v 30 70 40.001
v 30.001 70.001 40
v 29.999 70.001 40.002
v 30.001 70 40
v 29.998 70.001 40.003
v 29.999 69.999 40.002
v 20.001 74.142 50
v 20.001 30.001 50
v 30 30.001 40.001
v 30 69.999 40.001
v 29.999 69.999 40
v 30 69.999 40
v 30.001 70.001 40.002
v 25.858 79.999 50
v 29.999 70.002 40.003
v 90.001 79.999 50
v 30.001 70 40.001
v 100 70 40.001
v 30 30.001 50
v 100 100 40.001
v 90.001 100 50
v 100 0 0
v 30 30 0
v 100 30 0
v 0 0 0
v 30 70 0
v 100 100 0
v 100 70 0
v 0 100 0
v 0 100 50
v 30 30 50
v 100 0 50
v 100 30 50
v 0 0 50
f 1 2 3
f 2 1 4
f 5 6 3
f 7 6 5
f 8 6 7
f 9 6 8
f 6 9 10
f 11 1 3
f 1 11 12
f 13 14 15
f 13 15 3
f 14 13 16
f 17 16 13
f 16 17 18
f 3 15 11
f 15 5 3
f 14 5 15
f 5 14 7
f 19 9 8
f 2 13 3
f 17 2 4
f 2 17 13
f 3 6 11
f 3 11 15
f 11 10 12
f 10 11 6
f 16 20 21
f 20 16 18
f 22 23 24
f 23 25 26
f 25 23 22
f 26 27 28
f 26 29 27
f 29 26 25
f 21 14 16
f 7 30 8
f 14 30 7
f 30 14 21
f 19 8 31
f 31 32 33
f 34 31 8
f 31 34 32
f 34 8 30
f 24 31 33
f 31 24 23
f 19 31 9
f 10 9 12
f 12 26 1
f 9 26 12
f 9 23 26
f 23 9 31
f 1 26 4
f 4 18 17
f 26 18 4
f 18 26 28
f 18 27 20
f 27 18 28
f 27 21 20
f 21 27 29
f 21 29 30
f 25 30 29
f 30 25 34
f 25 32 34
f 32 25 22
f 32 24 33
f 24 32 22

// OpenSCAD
//==============================================================================
//
//           prism-chamfer - the missing chamfer tool for OpenSCAD
//
// Author:  Heath Raftery
// Origin:  http://github.com/hraftery/prism-chamfer
// License: GPLv3, see LICENSE for terms.
//
// See the accompanying README for instructions on use.
//
//==============================================================================

// Thingiverse requires a single .scad file, so instead of using an include
// the file's contents are appended below.
//include <prism-chamfer.scad>;

// Thingiverse also doesn't support boolean variables, hence the "0:false" trick below.

// Zero-based index of first edge in the polygon to be chamfered.
Start_edge=3;
// Zero-based index of last edge. Must be equal to or greater than Start_edge.
End_edge=5;
// If true, chamfer the edges at the top of the prism. Else, chamfer the bottom edges.
Top=1; // [0:false, 1:true]
// Length of the sides of the chamfer, or just the top/bottom side if Enable_side2 is true.
Side_length=10;
// If true, allow the length of the sides of the chamfer to be set independantly.
Enable_side2=0; // [0:false, 1:true]
// If Enable_side2 is true, length of the side parallel to the z-axis. Ignored otherwise.
Side2_length=15;
// Depth of the chamfer in any inner corners between start_edge and end_edge.
Corner_slope="medium"; // [shallow, medium, deep]

difference() {
  polygon_points = [[0,0],[100,0],[100,30],[30,30],[30,70],[100,70],[100,100],[0,100]];
  h=50;
  linear_extrude(height=h)
    polygon(polygon_points, convexity=2);

  prism_chamfer_mask(polygon_points, Start_edge, End_edge, Top?h:0,
                     Side_length, Enable_side2 ? Side2_length : Side_length, Corner_slope);
}




// The contents of prism-chamfer.scad follow


//===========
// Variables
//===========

ff=0.001; // Fudge factor: amount of extra mask to prevent zero thickness planes.


//===========
// Functions
//===========

function angle_of(p0, p1) = atan2(p1.y-p0.y, p1.x-p0.x); //note contrary to docs, atan2 returns [-180,180]
function translate_towards(p0, p1, dist) = p0 + (dist/norm(p1-p0))*(p1-p0);
function min_index(v, only_first=false) = search(min(v), v, only_first?1:0);
function max_index(v, only_first=false) = search(max(v), v, only_first?1:0);

//Return the three points that define the vertex at the point specified
function vertex_points(polygon_points, point_index) =
  let (num_pts = len(polygon_points))
    [ polygon_points[(point_index-1+num_pts) % num_pts],
      polygon_points[ point_index                     ],
      polygon_points[(point_index+1)         % num_pts] ];

//Determine orientation of polygon. Ref:
//  https://en.wikipedia.org/wiki/Curve_orientation#Orientation_of_a_simple_polygon
function is_polygon_orientation_clockwise(polygon_points) =
  let (min_x_indices                = min_index([for (pt = polygon_points) pt.x]),
       min_y_index_in_min_x_indices = min_index([for (i = min_x_indices) polygon_points[i].y]),
       min_x_min_y_index            = min_x_indices[min_y_index_in_min_x_indices[0]],
       vertex_pts                   = vertex_points(polygon_points, min_x_min_y_index))
    is_vertex_convex(vertex_pts, true);

function is_vertex_convex(pts, cw) =
  let (A = pts[0], B = pts[1], C = pts[2],
       //This determinate calc is the same as cross(AB,BC). But we have points,
       //so use the simplification from the polygon orientation reference above.
       det = (B.x-A.x)*(C.y-A.y) - (C.x-A.x)*(B.y-A.y),
       right_turn = det < 0)
    cw == right_turn; //right turns are convex when going cw, and vice-versa


//===========
//  Modules  
//===========

//Create masks for 1 or more prism edges and any corners in between.
//See "prism-chamfer_demo.scad" for a description of the arguments.
module prism_chamfer_mask(polygon_pts, start_edge=0, end_edge=0, height=0,
                          side=1, side2=0, corner_slope="medium") {
  assert(len(polygon_pts) >= 3);
  assert(end_edge >= start_edge);
  assert(start_edge >= 0 && end_edge < len(polygon_pts)-1);
    
  points = [ for(i = [start_edge:end_edge+1])
             [polygon_pts[i].x, polygon_pts[i].y, height] ];
  
  cw = is_polygon_orientation_clockwise(polygon_pts);
  
  include_start = is_vertex_convex(vertex_points(polygon_pts, start_edge), cw);
  include_end   = is_vertex_convex(vertex_points(polygon_pts, end_edge+1), cw);
  
  prism_chamfer_mask_raw(points, side, side2, cw,
                         corner_slope  = corner_slope,
                         include_start = include_start,
                         include_end   = include_end);
}

//Create masks for 1 or more prism edges and any corners inbetween,
//but their points and end conditions must be specified.
module prism_chamfer_mask_raw(points, side=1, side2=0, cw=false, top=undef,
                              corner_slope="medium", include_start=false, include_end=false) {
  num_points = len(points);
  assert(num_points>1);
  for(i = [0:num_points-2]) {
    prism_chamfer_mask_e(points[i], points[i+1], side, side2, cw, top,
                         include_p0 = i==0            ? include_start : true,
                         include_p1 = i==num_points-2 ? include_end   : true);
    
    if(i<num_points-2) {
      prism_chamfer_mask_c(points[i], points[i+1], points[i+2], side, side2, cw, top,
                           slope = corner_slope);
    }
  }
}

//Create a chamfer mask for a single prism edge.
module prism_chamfer_mask_e(p0, p1, side=1, side2=0, cw=false, top=undef,
                            include_p0=true, include_p1=true) {
  side2 = side2 == 0 ? side : side2;    //set sides equal unless side2 is specified
  top = is_undef(top) ? p0.z > 0 : top; //set top to positivity of z unless specified
  assert(p0.z == p1.z); //only points in the same x-y plane are supported
  assert(side>0 && side2>0);
  assert(p0!=p1);

  //Conditional transforms don't seem to be supported. Fortunately mirror
  //seems to be a nop if the argument is [0,0,0], so we can use a variable
  //and this dodgy conditional assignment construct instead:
  mr_args = (!top &&  cw) ? [[1,0,0],[ 90,0,-90]] : //bottom, cw
            ( top &&  cw) ? [[0,0,0],[-90,0,-90]] : //top, cw
            ( top && !cw) ? [[1,0,0],[-90,0, 90]] : //top, ccw
                            [[0,0,0],[ 90,0, 90]];  //bottom, ccw
    
  length = norm(p1-p0) + (include_p0?ff:-ff) + (include_p1?ff:-ff);
  p0_fudged = translate_towards(p0, p1, include_p0?-ff:ff); //shift p0 fwd or back by fudge factor
  translate(p0_fudged) rotate([0, 0, angle_of(p0, p1)]) //align with p0 -> p1
    mirror(mr_args[0]) rotate(mr_args[1]) //orient to x-y plane, in +x direction
      linear_extrude(height=length)
        polygon([[-ff,-ff],[side,-ff],[-ff,side2]]);
}

//Create a chamfer mask for the corner between two prism edges.
module prism_chamfer_mask_c(p0, p1, p2, side=1, side2=0, cw=false, top=undef,
                            slope="medium") {
  side2 = side2 == 0 ? side : side2;    //set sides equal unless side2 is specified
  top = is_undef(top) ? p0.z > 0 : top; //set top to positivity of z unless specified
  assert(p0.z == p1.z && p1.z == p2.z); //only points in the same x-y plane are supported
  assert(side>0 && side2>0);
  assert(p0!=p1 && p1!=p2 && p0!=p2);
  
  corner_angle = 0.5 * (angle_of(p0,p1) + angle_of(p1,p2));
  
  if(is_vertex_convex([p0,p1,p2],cw)) {
    //no mask needed for outside corners
  }
  else if(slope=="deep") {    //then carve out as much as possible
    intersection() {
      //Just extend the two edge chamfers so they overlap fully.
      prism_chamfer_mask_e(p1, translate_towards(p1,p0,-side), side, side2, cw, top);
      prism_chamfer_mask_e(translate_towards(p1,p2,-side), p1, side, side2, cw, top);
    }
  }
  else if(slope=="shallow") { //then carve out as little as possible. Inspired by corner-tools.scad
    translate(p1) rotate([0, 0, corner_angle])
      rotate([0, 0, 45]) //rotate to put it symmetrical around the x axis
        polyhedron(points = [[-ff,-ff,ff], [side,-ff,ff], [-ff,side,ff], [-ff,-ff,-side2]],
                   faces  = [[0,2,1], [0,1,3], [0,3,2], [1,2,3]],
                   convexity = 100);
  }
  else {                      //otherwise, do a "medium" half-way corner
    c0 = [p1.x - side*cos(corner_angle), p1.y - side*sin(corner_angle), p1.z];
    c1 = [p1.x + side*cos(corner_angle), p1.y + side*sin(corner_angle), p1.z];
    intersection() {
      //Same as "deep", but also intersect a third mask with angle half-way between
      //the first two. c0 and c1 just extend the edge either side of the corner point.
      prism_chamfer_mask_e(p1, translate_towards(p1,p0,-side), side, side2, cw, top);
      prism_chamfer_mask_e(translate_towards(p1,p2,-side), p1, side, side2, cw, top);
      prism_chamfer_mask_e(c0, c1, side, side2, cw, top);
    }
  }
}
